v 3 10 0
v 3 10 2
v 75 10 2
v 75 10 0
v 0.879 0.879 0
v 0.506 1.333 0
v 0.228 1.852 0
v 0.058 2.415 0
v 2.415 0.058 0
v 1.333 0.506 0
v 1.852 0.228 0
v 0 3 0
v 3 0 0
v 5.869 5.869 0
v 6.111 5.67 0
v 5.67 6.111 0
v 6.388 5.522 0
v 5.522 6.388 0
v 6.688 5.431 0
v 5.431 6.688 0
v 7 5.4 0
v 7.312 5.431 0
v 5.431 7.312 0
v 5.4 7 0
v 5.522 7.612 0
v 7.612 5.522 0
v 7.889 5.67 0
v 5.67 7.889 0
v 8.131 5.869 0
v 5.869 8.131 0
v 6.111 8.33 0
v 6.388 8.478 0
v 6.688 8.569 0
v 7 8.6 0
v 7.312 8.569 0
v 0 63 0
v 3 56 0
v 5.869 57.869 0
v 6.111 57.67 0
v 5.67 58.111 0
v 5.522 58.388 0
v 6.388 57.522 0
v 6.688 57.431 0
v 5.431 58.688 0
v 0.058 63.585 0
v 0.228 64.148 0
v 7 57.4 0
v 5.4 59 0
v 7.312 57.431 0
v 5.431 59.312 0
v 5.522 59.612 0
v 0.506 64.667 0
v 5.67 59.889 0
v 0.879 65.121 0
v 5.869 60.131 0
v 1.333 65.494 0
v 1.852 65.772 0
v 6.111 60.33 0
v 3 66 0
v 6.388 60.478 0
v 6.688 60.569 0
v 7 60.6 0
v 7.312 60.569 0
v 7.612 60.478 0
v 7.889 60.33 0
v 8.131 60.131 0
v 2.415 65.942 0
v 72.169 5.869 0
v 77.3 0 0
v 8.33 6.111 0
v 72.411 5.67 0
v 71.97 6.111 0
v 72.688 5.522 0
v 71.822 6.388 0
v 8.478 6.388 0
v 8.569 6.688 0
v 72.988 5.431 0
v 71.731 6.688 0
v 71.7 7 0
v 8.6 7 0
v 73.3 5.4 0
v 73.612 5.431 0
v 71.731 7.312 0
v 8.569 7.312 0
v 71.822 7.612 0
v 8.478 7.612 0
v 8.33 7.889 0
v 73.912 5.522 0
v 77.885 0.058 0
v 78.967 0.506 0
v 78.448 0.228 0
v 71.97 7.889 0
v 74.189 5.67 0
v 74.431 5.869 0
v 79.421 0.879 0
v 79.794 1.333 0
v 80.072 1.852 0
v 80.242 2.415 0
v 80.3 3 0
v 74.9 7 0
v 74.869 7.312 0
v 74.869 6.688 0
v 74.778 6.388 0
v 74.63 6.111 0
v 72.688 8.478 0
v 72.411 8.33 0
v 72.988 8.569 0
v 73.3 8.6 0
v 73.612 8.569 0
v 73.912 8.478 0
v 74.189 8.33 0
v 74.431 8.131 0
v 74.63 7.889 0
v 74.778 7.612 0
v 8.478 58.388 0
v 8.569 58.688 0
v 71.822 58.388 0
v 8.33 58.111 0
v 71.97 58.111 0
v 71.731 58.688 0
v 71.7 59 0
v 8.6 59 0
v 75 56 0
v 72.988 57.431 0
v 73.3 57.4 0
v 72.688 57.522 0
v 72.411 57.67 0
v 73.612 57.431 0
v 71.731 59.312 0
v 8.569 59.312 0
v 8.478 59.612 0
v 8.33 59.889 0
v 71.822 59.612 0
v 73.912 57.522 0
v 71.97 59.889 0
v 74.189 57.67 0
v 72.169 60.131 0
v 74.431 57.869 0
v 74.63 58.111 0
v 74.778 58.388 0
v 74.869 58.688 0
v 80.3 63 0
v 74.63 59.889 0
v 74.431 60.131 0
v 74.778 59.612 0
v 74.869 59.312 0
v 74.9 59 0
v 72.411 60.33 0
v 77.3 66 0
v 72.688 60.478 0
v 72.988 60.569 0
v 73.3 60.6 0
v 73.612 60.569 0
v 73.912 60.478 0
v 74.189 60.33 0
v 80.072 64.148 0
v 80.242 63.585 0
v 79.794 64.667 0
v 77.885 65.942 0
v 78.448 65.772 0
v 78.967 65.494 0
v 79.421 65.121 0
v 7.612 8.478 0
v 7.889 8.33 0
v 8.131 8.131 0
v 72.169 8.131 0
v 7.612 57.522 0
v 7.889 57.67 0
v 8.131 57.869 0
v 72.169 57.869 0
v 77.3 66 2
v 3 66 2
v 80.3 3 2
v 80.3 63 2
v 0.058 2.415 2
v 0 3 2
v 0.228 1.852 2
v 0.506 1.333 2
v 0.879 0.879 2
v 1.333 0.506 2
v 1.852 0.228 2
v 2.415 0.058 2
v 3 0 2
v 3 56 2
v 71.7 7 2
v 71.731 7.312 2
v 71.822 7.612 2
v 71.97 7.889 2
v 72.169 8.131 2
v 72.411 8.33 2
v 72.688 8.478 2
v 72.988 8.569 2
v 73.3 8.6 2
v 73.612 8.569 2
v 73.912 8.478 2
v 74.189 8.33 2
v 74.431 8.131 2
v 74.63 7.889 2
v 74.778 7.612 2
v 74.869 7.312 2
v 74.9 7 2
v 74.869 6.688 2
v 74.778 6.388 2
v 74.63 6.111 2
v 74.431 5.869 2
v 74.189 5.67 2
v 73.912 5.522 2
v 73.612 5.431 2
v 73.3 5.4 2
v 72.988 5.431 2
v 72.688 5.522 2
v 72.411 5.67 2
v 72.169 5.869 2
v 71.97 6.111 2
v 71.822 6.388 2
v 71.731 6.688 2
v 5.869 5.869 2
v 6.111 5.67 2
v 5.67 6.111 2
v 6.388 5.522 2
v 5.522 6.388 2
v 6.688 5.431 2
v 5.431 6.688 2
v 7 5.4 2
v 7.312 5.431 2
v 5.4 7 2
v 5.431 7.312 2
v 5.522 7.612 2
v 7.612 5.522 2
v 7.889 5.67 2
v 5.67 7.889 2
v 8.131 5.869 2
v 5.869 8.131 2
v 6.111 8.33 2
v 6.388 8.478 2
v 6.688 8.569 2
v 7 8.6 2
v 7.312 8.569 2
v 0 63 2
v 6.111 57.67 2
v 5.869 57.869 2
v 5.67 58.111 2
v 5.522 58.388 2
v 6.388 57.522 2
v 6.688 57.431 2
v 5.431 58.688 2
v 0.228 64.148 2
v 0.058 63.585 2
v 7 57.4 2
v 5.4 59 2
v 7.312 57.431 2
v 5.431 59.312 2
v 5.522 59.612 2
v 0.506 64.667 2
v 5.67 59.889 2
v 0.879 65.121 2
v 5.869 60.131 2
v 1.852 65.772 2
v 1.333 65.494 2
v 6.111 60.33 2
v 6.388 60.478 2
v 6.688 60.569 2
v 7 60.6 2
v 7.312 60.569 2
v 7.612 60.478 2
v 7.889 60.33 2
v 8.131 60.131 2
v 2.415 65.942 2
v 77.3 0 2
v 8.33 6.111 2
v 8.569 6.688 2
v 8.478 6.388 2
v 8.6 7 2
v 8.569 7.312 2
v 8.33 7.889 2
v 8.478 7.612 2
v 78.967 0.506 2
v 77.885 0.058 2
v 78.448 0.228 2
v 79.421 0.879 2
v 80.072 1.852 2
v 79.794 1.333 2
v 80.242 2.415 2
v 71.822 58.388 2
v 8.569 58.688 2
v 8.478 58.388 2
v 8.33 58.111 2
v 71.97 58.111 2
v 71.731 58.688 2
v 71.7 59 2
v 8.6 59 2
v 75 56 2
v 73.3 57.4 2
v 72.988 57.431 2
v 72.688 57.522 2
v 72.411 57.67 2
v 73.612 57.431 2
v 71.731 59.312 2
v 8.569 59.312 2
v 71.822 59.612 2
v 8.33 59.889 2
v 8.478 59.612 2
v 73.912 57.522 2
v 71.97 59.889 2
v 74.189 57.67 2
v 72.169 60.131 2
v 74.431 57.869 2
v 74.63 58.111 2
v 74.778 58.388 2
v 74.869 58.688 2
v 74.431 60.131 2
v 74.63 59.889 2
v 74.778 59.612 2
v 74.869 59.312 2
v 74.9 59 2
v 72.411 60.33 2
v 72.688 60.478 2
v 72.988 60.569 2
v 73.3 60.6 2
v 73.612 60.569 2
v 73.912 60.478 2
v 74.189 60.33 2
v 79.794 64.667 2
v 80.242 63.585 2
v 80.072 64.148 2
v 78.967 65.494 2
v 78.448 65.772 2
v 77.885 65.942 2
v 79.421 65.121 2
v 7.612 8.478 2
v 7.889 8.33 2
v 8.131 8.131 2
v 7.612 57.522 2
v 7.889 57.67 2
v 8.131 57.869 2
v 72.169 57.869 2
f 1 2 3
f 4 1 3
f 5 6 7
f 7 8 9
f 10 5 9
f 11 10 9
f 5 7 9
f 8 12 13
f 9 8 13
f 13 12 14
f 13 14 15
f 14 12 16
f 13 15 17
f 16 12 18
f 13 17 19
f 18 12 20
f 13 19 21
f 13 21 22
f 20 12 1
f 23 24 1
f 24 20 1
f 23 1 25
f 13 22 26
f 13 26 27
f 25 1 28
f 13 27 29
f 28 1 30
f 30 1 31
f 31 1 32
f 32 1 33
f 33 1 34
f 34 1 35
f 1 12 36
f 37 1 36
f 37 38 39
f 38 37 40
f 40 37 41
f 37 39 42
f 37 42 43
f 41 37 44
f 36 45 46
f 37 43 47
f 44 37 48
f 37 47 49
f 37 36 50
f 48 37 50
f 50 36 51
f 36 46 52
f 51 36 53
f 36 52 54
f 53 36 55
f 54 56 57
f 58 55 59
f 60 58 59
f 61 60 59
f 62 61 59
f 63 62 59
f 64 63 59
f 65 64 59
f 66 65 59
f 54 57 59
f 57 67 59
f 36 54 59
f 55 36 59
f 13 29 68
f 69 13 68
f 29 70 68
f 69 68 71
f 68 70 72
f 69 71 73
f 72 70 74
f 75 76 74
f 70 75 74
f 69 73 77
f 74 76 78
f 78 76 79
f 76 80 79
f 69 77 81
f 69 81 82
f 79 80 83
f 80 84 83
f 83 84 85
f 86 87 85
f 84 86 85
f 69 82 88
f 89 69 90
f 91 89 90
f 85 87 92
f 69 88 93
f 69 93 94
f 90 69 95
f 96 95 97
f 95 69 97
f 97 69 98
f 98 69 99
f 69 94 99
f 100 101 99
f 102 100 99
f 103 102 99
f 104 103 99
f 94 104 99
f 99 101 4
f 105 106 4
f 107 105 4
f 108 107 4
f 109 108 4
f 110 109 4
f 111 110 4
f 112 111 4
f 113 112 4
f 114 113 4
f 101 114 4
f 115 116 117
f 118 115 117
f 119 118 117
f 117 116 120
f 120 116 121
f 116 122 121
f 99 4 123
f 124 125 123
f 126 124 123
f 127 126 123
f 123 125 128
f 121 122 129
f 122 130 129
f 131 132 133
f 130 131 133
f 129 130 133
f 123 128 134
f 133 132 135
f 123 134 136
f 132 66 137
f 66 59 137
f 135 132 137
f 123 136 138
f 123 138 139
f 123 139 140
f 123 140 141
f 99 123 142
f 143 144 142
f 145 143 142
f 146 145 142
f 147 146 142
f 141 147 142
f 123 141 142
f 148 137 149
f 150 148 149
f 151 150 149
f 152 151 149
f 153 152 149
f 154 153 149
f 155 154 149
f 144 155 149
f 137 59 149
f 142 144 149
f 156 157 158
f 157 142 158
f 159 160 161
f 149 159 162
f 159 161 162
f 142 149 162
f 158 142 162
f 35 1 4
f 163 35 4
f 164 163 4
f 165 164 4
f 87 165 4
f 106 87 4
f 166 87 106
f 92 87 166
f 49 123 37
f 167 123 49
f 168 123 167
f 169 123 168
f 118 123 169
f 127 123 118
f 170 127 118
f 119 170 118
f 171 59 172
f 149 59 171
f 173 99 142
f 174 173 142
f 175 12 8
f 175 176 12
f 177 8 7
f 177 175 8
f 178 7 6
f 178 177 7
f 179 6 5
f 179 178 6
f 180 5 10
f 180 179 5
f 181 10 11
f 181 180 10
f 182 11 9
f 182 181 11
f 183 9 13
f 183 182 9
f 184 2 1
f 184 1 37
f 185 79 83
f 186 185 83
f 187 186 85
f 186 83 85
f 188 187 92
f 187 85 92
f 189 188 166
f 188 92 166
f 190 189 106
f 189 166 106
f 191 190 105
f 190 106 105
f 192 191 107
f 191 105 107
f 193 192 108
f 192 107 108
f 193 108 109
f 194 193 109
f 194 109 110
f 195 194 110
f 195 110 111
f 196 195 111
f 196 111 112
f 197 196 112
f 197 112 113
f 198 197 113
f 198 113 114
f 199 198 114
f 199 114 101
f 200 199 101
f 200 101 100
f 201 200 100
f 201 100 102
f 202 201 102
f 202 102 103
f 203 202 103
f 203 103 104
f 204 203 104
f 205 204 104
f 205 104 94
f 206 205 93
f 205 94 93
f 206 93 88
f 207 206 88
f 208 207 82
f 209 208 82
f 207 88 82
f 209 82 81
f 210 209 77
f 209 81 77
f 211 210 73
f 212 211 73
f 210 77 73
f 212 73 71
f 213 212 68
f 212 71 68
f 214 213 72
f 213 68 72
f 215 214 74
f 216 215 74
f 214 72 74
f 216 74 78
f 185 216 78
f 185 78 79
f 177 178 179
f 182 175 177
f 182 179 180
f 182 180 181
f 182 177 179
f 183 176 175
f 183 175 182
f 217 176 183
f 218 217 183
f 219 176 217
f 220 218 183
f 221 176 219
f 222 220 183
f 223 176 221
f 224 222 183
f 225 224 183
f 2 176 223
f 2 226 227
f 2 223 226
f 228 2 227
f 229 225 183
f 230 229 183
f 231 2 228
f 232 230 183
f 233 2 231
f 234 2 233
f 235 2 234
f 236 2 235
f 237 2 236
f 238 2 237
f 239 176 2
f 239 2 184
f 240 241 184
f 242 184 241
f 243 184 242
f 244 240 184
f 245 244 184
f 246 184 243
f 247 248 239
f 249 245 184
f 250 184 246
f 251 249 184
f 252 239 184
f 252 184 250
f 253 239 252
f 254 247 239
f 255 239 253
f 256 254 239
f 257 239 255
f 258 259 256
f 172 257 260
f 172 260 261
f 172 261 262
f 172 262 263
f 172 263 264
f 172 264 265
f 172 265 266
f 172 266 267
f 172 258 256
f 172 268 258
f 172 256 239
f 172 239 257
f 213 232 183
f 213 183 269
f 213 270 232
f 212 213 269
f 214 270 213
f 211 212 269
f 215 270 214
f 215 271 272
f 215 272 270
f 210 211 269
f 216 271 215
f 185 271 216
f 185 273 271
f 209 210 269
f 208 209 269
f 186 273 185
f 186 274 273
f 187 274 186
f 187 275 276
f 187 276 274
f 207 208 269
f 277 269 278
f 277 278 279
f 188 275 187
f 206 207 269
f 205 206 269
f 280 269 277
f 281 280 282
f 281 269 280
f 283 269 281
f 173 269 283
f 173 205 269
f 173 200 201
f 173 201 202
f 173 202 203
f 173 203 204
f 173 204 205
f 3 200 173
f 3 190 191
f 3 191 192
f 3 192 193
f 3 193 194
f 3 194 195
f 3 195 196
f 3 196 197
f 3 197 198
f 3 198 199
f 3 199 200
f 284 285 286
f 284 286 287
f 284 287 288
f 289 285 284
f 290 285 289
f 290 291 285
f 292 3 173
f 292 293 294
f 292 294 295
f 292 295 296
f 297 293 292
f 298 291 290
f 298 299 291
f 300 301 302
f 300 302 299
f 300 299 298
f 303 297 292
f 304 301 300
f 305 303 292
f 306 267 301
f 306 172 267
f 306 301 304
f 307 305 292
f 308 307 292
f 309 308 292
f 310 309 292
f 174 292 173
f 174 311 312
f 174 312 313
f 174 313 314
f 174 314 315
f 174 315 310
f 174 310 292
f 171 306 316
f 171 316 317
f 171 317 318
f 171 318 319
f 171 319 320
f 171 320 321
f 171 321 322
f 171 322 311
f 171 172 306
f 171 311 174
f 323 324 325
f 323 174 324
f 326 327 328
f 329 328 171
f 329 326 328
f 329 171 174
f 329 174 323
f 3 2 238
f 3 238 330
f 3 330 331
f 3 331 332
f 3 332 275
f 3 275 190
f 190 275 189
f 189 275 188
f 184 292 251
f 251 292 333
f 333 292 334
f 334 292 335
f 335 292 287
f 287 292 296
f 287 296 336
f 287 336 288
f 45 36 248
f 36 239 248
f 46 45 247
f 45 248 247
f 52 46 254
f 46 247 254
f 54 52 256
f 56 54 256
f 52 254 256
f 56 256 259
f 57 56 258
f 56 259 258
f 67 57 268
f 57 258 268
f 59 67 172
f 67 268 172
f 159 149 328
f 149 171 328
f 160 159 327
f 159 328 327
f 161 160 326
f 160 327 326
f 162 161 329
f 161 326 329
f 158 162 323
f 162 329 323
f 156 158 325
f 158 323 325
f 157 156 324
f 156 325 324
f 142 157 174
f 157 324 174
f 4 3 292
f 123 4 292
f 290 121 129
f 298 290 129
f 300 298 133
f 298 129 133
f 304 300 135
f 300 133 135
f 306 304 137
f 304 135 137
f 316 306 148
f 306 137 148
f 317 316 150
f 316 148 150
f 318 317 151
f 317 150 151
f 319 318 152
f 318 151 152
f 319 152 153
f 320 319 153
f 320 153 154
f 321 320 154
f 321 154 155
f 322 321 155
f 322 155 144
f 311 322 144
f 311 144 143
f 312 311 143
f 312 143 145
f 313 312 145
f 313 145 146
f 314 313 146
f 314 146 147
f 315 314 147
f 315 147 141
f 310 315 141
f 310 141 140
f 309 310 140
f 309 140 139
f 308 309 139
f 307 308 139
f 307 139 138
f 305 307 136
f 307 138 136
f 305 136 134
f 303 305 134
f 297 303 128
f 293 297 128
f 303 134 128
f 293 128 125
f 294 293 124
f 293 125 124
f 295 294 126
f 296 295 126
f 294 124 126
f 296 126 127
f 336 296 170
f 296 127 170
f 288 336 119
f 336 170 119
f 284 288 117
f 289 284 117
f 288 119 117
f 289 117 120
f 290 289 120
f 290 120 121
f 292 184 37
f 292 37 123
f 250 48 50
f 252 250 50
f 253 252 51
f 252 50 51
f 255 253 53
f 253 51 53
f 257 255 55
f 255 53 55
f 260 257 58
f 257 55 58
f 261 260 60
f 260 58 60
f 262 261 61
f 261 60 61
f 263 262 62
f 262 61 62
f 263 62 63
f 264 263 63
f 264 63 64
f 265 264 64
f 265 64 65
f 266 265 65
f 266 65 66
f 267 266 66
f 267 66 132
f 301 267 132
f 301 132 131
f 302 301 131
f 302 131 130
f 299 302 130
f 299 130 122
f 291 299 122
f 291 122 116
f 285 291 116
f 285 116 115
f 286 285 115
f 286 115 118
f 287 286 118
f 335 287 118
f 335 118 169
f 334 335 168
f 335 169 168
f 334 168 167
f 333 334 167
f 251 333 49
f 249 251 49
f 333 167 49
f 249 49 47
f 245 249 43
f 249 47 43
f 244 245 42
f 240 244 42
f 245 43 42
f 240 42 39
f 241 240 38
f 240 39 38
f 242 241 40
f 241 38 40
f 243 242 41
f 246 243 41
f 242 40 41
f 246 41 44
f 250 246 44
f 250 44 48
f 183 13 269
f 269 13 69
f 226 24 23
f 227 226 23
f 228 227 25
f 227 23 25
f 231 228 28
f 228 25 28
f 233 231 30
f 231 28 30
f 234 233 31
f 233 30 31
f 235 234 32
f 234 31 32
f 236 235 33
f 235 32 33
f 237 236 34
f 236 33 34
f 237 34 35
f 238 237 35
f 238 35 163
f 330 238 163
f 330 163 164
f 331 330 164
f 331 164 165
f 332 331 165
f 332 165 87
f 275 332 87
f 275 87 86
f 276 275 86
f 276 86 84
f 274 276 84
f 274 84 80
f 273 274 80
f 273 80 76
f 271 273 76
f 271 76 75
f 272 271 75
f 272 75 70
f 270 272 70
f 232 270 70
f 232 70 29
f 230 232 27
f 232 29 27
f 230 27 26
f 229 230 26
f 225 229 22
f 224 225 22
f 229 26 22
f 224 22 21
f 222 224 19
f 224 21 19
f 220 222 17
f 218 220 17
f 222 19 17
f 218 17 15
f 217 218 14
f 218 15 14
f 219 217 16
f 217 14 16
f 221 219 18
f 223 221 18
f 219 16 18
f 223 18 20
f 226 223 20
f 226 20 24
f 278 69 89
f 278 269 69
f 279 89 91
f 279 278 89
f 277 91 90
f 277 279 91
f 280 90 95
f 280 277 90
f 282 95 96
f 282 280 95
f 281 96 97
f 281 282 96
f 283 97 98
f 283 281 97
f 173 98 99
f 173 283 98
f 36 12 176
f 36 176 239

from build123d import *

# Parameters (mm, degrees)
SKETCH1_W                  = 80.3
SKETCH1_H                  = 66
BOSS_EXTRUDE1_DEPTH        = 2
F_3_2_3_2_DIAMETER_HOLE1_D = 3.2
FILLET1_R                  = 3
SKETCH4_W                  = 72
SKETCH4_H                  = 46
CUT_EXTRUDE1_DEPTH         = 3


with BuildPart() as part:
    # Sketch1 → Boss-Extrude1 (new body)
    with BuildSketch(Plane.XY):
        with Locations((40.15, 33)):
            Rectangle(SKETCH1_W, SKETCH1_H)
    extrude(amount=BOSS_EXTRUDE1_DEPTH)

    # Ø3.2 (3.2) Diameter Hole1 (through all)
    with Locations(Plane.XY.offset(2)):
        with Locations((7, 59), (73.3, 59), (73.3, 7), (7, 7)):
            Hole(F_3_2_3_2_DIAMETER_HOLE1_D / 2)

    # Fillet1
    fillet1_edges = [part.edges().sort_by_distance(p)[0] for p in [
        (0, 66, 1),
        (80.3, 66, 1),
        (80.3, 0, 1),
        (0, 0, 1),
    ]]
    fillet(fillet1_edges, radius=FILLET1_R)

    # Sketch4 → Cut-Extrude1 (cut, through all)
    with BuildSketch(Plane.XY.offset(2)):
        with Locations((39, 33)):
            Rectangle(SKETCH4_W, SKETCH4_H)
    extrude(amount=-CUT_EXTRUDE1_DEPTH, mode=Mode.SUBTRACT)


solid = part.part
